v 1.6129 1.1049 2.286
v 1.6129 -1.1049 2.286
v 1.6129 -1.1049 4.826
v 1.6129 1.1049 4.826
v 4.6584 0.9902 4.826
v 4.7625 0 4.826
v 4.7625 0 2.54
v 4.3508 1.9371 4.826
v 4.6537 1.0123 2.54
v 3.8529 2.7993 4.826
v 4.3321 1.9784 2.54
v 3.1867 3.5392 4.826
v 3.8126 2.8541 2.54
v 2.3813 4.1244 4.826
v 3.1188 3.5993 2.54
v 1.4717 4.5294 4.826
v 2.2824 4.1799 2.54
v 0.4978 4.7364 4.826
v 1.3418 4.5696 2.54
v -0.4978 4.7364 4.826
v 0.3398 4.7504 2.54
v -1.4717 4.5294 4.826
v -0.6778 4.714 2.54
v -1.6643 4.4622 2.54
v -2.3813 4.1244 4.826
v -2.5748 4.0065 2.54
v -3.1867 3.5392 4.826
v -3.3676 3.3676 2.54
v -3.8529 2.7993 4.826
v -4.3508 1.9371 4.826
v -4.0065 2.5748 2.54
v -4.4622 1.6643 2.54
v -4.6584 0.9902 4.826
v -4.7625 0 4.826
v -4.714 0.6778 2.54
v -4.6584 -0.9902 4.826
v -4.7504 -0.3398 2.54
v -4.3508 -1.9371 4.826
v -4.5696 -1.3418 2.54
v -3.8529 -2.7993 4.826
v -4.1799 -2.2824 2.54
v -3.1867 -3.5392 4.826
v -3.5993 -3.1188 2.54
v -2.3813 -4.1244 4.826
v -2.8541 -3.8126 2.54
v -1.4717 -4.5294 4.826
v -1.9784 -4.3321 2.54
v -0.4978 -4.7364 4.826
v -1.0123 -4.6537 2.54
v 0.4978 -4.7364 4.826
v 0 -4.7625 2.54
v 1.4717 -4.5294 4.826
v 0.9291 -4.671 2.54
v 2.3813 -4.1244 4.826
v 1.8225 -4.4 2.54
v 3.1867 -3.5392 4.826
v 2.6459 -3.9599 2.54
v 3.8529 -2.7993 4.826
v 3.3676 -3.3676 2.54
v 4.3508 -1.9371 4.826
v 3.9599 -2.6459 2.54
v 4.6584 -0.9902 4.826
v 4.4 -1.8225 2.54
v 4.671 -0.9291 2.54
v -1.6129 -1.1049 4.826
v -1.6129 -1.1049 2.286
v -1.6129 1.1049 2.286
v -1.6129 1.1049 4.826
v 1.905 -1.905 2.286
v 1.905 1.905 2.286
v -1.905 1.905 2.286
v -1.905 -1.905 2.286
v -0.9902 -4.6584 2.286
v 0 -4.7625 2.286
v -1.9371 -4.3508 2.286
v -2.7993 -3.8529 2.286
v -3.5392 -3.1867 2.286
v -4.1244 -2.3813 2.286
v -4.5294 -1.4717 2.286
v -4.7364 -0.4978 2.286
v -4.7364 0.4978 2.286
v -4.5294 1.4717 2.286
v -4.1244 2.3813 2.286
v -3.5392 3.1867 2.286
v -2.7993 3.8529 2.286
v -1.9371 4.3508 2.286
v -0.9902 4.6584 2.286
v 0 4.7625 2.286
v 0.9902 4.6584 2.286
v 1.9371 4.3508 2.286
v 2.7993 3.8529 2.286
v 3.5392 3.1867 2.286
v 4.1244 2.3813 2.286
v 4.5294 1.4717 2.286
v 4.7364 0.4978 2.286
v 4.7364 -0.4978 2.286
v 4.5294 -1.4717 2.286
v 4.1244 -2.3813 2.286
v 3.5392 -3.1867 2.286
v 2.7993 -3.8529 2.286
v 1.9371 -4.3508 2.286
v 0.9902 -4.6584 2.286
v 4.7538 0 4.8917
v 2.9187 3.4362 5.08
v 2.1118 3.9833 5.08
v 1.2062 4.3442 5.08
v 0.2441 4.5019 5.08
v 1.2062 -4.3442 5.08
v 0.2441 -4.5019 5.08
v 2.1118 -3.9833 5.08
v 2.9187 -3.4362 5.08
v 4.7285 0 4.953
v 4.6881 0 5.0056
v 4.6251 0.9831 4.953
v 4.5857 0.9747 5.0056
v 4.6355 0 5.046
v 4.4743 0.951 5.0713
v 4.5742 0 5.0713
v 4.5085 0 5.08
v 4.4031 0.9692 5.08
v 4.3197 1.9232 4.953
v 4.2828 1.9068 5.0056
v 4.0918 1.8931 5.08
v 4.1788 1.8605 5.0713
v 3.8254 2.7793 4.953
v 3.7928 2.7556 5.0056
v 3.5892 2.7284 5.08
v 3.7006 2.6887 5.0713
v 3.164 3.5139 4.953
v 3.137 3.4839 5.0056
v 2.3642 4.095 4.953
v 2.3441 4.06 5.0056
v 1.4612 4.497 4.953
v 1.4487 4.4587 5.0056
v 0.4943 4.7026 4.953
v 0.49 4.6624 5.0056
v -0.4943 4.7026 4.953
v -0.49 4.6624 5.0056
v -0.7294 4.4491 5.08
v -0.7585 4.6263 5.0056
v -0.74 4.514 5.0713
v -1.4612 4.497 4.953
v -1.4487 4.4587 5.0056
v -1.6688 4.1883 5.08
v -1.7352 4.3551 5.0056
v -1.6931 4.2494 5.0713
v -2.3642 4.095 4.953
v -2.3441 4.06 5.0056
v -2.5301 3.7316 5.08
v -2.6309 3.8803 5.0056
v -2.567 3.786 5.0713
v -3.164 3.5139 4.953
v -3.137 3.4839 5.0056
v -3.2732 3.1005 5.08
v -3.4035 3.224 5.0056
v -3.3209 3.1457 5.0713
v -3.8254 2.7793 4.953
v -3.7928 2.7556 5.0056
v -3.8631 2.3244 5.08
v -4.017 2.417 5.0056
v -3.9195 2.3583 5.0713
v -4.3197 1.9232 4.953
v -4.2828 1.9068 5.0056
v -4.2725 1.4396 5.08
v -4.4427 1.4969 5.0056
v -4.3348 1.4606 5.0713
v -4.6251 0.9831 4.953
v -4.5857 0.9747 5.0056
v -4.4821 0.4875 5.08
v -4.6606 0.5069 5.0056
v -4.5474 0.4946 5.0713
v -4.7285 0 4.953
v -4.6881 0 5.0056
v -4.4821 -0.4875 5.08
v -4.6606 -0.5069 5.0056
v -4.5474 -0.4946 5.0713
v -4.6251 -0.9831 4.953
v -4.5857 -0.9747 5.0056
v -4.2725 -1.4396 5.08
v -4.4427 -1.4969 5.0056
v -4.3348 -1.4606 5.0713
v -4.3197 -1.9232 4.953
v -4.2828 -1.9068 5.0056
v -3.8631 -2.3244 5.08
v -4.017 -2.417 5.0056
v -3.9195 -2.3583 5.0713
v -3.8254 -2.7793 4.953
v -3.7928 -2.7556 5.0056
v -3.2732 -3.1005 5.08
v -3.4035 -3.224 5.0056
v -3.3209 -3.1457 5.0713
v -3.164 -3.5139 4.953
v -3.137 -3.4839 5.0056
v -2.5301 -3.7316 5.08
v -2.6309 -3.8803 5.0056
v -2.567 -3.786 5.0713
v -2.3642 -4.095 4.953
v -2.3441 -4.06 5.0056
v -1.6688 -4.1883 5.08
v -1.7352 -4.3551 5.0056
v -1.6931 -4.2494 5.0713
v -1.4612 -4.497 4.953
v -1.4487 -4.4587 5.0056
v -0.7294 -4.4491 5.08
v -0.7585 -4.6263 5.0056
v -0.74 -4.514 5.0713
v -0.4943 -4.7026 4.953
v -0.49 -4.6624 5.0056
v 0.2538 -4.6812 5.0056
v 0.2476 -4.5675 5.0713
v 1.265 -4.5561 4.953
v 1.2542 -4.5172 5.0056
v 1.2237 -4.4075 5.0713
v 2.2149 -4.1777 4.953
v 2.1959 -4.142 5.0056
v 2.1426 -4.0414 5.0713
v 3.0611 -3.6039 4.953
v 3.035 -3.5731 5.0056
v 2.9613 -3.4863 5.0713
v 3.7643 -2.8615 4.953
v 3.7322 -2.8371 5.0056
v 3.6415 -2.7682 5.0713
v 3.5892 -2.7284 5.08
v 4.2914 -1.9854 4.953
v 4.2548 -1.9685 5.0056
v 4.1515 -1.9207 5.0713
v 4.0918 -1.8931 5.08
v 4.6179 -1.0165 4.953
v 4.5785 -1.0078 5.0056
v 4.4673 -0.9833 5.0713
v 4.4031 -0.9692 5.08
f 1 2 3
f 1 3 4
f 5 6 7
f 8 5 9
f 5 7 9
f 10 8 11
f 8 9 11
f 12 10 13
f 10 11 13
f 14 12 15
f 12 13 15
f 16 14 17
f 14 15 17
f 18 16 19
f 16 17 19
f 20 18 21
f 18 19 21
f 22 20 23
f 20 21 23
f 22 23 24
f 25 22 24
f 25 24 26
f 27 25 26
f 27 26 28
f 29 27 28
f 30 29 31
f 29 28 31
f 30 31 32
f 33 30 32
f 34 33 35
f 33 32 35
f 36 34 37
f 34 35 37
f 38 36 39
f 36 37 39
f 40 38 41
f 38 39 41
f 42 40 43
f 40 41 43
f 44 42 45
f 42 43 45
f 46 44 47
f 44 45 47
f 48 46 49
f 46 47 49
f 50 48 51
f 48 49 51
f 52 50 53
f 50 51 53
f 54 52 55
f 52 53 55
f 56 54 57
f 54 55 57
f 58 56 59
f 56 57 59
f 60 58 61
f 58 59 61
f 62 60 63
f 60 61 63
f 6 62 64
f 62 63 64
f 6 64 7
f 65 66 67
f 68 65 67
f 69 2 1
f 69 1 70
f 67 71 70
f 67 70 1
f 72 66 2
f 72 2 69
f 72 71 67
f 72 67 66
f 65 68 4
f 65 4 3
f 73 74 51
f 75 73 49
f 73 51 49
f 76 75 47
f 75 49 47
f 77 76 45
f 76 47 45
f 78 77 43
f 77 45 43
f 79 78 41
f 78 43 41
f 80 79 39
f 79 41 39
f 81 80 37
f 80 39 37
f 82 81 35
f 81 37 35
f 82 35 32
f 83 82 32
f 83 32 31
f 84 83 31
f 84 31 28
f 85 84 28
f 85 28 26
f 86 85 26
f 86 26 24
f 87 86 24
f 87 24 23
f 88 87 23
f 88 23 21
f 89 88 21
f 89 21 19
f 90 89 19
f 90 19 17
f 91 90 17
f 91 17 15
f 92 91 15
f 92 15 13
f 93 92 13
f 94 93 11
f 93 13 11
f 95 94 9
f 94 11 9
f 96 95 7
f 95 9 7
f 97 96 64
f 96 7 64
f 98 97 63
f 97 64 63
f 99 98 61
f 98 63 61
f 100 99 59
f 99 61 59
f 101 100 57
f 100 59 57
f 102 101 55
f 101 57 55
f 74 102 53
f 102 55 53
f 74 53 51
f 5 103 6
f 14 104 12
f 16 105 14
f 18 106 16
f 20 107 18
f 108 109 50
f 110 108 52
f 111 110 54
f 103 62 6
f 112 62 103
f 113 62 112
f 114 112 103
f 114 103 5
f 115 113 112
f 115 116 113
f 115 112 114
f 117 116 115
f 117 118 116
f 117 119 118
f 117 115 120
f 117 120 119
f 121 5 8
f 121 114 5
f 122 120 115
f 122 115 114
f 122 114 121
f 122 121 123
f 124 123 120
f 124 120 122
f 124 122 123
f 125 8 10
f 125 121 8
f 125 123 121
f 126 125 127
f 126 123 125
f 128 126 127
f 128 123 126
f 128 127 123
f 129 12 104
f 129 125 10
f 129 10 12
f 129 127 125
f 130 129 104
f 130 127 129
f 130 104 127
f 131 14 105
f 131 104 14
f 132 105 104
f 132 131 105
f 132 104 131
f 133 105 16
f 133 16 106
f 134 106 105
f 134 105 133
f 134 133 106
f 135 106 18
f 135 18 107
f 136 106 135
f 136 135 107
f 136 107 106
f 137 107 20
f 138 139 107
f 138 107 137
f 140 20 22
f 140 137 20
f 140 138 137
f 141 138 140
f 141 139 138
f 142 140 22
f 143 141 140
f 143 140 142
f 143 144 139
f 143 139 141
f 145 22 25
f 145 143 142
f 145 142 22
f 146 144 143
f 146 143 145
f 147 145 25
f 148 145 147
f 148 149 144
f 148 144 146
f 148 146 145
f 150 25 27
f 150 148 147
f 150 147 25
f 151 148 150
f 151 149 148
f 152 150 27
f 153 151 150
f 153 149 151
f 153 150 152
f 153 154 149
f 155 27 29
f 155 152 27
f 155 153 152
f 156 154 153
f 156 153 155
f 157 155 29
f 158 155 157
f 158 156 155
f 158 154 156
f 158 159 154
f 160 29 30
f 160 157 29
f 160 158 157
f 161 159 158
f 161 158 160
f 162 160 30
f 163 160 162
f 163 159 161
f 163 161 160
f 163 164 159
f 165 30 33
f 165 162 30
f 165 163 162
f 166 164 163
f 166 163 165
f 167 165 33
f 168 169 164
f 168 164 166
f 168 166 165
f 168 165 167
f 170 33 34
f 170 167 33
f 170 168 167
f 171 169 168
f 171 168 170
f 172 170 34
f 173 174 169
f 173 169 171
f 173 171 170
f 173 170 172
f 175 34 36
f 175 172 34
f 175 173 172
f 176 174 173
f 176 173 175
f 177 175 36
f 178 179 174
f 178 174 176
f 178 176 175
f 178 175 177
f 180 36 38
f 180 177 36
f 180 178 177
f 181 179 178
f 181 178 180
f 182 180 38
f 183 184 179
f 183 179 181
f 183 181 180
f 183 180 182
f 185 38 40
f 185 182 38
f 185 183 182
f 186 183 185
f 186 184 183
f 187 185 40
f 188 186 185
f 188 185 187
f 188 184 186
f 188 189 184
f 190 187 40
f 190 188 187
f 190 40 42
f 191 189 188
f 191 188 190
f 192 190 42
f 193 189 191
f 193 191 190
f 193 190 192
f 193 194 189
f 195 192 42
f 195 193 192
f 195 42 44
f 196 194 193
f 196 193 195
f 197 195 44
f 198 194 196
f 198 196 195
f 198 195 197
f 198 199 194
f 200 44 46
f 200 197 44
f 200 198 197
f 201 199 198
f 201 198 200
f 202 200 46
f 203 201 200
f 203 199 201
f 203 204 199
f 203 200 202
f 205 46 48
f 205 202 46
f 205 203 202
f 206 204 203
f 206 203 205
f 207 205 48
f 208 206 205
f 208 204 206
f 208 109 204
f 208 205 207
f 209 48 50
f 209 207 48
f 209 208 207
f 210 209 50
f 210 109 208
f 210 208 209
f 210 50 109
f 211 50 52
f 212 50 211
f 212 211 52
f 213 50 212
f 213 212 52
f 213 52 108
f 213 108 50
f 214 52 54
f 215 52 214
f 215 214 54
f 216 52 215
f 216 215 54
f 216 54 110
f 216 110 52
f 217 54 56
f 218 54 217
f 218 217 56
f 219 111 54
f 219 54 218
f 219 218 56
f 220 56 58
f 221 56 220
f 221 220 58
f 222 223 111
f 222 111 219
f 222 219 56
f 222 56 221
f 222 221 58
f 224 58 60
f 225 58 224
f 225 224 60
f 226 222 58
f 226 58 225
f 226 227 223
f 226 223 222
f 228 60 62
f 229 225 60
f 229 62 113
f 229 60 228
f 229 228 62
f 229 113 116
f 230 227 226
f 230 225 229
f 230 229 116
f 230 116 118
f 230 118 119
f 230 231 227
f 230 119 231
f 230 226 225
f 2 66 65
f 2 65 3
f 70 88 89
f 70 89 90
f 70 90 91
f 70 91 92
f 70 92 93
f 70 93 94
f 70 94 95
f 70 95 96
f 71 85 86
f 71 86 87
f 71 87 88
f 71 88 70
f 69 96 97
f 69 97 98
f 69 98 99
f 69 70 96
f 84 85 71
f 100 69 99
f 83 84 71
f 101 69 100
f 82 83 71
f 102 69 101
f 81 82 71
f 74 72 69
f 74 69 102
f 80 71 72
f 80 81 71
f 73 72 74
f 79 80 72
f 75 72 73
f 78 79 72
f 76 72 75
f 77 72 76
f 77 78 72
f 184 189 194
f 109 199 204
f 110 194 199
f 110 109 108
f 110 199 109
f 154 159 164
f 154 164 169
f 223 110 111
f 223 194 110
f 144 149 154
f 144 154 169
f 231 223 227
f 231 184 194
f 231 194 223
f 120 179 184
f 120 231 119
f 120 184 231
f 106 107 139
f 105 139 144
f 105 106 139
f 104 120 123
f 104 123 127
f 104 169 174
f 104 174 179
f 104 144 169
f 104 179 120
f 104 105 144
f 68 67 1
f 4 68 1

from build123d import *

# Parameters (mm, degrees)
SKETCH_W           = 3.81
SKETCH_H           = 3.81
SKETCH_W_2         = 3.2258
SKETCH_H_2         = 2.2098
PAD_DEPTH          = 2.54
SKETCH001_R        = 4.7625
PAD001_DEPTH       = 2.54
FILLET_R           = 0.254
FILLET_FACE14_W    = 2.2098
FILLET_FACE14_H    = 3.2258
POCKET_DEPTH       = 2.286
POCKET_FACE11_W    = 3.81
POCKET_FACE11_H    = 3.81
POCKET_FACE11_W_2  = 2.2098
POCKET_FACE11_H_2  = 3.2258
POCKET001_DEPTH    = 2.286
POCKET001_FACE11_R = 4.7625
POCKET001_FACE11_W = 3.81
POCKET001_FACE11_H = 3.81
PAD002_DEPTH       = 0.254


with BuildPart() as part:
    # Sketch → Pad (new body)
    with BuildSketch(Plane.XY):
        Rectangle(SKETCH_W, SKETCH_H)
        Rectangle(SKETCH_W_2, SKETCH_H_2, mode=Mode.SUBTRACT)
    extrude(amount=PAD_DEPTH)

    # Sketch001 (on Face10 of Pad) → Pad001 (join)
    with BuildSketch(Plane.XY.offset(2.54)):
        Circle(SKETCH001_R)
    extrude(amount=PAD001_DEPTH)

    # Fillet
    fillet_edges = [part.edges().sort_by_distance(p)[0] for p in [
        (-4.7625, 0, 5.08),
    ]]
    fillet(fillet_edges, radius=FILLET_R)

    # Fillet Face14 → Pocket (cut)
    with BuildSketch(Plane(origin=(0, 0, 2.54), x_dir=(0, -1, 0), z_dir=(0, 0, -1))):
        Rectangle(FILLET_FACE14_W, FILLET_FACE14_H)
    extrude(amount=-POCKET_DEPTH, mode=Mode.SUBTRACT)

    # Pocket Face11 → Pocket001 (cut)
    with BuildSketch(Plane(origin=(0, 0, 0), x_dir=(0, -1, 0), z_dir=(0, 0, -1))):
        Rectangle(POCKET_FACE11_W, POCKET_FACE11_H)
        Rectangle(POCKET_FACE11_W_2, POCKET_FACE11_H_2, mode=Mode.SUBTRACT)
    extrude(amount=-POCKET001_DEPTH, mode=Mode.SUBTRACT)

    # Pocket001 Face11 → Pad002 (add)
    with BuildSketch(Plane(origin=(0, 0, 2.54), x_dir=(0, -1, 0), z_dir=(0, 0, -1))):
        Circle(POCKET001_FACE11_R)
        Rectangle(POCKET001_FACE11_W, POCKET001_FACE11_H, mode=Mode.SUBTRACT)
    extrude(amount=PAD002_DEPTH)


solid = part.part
